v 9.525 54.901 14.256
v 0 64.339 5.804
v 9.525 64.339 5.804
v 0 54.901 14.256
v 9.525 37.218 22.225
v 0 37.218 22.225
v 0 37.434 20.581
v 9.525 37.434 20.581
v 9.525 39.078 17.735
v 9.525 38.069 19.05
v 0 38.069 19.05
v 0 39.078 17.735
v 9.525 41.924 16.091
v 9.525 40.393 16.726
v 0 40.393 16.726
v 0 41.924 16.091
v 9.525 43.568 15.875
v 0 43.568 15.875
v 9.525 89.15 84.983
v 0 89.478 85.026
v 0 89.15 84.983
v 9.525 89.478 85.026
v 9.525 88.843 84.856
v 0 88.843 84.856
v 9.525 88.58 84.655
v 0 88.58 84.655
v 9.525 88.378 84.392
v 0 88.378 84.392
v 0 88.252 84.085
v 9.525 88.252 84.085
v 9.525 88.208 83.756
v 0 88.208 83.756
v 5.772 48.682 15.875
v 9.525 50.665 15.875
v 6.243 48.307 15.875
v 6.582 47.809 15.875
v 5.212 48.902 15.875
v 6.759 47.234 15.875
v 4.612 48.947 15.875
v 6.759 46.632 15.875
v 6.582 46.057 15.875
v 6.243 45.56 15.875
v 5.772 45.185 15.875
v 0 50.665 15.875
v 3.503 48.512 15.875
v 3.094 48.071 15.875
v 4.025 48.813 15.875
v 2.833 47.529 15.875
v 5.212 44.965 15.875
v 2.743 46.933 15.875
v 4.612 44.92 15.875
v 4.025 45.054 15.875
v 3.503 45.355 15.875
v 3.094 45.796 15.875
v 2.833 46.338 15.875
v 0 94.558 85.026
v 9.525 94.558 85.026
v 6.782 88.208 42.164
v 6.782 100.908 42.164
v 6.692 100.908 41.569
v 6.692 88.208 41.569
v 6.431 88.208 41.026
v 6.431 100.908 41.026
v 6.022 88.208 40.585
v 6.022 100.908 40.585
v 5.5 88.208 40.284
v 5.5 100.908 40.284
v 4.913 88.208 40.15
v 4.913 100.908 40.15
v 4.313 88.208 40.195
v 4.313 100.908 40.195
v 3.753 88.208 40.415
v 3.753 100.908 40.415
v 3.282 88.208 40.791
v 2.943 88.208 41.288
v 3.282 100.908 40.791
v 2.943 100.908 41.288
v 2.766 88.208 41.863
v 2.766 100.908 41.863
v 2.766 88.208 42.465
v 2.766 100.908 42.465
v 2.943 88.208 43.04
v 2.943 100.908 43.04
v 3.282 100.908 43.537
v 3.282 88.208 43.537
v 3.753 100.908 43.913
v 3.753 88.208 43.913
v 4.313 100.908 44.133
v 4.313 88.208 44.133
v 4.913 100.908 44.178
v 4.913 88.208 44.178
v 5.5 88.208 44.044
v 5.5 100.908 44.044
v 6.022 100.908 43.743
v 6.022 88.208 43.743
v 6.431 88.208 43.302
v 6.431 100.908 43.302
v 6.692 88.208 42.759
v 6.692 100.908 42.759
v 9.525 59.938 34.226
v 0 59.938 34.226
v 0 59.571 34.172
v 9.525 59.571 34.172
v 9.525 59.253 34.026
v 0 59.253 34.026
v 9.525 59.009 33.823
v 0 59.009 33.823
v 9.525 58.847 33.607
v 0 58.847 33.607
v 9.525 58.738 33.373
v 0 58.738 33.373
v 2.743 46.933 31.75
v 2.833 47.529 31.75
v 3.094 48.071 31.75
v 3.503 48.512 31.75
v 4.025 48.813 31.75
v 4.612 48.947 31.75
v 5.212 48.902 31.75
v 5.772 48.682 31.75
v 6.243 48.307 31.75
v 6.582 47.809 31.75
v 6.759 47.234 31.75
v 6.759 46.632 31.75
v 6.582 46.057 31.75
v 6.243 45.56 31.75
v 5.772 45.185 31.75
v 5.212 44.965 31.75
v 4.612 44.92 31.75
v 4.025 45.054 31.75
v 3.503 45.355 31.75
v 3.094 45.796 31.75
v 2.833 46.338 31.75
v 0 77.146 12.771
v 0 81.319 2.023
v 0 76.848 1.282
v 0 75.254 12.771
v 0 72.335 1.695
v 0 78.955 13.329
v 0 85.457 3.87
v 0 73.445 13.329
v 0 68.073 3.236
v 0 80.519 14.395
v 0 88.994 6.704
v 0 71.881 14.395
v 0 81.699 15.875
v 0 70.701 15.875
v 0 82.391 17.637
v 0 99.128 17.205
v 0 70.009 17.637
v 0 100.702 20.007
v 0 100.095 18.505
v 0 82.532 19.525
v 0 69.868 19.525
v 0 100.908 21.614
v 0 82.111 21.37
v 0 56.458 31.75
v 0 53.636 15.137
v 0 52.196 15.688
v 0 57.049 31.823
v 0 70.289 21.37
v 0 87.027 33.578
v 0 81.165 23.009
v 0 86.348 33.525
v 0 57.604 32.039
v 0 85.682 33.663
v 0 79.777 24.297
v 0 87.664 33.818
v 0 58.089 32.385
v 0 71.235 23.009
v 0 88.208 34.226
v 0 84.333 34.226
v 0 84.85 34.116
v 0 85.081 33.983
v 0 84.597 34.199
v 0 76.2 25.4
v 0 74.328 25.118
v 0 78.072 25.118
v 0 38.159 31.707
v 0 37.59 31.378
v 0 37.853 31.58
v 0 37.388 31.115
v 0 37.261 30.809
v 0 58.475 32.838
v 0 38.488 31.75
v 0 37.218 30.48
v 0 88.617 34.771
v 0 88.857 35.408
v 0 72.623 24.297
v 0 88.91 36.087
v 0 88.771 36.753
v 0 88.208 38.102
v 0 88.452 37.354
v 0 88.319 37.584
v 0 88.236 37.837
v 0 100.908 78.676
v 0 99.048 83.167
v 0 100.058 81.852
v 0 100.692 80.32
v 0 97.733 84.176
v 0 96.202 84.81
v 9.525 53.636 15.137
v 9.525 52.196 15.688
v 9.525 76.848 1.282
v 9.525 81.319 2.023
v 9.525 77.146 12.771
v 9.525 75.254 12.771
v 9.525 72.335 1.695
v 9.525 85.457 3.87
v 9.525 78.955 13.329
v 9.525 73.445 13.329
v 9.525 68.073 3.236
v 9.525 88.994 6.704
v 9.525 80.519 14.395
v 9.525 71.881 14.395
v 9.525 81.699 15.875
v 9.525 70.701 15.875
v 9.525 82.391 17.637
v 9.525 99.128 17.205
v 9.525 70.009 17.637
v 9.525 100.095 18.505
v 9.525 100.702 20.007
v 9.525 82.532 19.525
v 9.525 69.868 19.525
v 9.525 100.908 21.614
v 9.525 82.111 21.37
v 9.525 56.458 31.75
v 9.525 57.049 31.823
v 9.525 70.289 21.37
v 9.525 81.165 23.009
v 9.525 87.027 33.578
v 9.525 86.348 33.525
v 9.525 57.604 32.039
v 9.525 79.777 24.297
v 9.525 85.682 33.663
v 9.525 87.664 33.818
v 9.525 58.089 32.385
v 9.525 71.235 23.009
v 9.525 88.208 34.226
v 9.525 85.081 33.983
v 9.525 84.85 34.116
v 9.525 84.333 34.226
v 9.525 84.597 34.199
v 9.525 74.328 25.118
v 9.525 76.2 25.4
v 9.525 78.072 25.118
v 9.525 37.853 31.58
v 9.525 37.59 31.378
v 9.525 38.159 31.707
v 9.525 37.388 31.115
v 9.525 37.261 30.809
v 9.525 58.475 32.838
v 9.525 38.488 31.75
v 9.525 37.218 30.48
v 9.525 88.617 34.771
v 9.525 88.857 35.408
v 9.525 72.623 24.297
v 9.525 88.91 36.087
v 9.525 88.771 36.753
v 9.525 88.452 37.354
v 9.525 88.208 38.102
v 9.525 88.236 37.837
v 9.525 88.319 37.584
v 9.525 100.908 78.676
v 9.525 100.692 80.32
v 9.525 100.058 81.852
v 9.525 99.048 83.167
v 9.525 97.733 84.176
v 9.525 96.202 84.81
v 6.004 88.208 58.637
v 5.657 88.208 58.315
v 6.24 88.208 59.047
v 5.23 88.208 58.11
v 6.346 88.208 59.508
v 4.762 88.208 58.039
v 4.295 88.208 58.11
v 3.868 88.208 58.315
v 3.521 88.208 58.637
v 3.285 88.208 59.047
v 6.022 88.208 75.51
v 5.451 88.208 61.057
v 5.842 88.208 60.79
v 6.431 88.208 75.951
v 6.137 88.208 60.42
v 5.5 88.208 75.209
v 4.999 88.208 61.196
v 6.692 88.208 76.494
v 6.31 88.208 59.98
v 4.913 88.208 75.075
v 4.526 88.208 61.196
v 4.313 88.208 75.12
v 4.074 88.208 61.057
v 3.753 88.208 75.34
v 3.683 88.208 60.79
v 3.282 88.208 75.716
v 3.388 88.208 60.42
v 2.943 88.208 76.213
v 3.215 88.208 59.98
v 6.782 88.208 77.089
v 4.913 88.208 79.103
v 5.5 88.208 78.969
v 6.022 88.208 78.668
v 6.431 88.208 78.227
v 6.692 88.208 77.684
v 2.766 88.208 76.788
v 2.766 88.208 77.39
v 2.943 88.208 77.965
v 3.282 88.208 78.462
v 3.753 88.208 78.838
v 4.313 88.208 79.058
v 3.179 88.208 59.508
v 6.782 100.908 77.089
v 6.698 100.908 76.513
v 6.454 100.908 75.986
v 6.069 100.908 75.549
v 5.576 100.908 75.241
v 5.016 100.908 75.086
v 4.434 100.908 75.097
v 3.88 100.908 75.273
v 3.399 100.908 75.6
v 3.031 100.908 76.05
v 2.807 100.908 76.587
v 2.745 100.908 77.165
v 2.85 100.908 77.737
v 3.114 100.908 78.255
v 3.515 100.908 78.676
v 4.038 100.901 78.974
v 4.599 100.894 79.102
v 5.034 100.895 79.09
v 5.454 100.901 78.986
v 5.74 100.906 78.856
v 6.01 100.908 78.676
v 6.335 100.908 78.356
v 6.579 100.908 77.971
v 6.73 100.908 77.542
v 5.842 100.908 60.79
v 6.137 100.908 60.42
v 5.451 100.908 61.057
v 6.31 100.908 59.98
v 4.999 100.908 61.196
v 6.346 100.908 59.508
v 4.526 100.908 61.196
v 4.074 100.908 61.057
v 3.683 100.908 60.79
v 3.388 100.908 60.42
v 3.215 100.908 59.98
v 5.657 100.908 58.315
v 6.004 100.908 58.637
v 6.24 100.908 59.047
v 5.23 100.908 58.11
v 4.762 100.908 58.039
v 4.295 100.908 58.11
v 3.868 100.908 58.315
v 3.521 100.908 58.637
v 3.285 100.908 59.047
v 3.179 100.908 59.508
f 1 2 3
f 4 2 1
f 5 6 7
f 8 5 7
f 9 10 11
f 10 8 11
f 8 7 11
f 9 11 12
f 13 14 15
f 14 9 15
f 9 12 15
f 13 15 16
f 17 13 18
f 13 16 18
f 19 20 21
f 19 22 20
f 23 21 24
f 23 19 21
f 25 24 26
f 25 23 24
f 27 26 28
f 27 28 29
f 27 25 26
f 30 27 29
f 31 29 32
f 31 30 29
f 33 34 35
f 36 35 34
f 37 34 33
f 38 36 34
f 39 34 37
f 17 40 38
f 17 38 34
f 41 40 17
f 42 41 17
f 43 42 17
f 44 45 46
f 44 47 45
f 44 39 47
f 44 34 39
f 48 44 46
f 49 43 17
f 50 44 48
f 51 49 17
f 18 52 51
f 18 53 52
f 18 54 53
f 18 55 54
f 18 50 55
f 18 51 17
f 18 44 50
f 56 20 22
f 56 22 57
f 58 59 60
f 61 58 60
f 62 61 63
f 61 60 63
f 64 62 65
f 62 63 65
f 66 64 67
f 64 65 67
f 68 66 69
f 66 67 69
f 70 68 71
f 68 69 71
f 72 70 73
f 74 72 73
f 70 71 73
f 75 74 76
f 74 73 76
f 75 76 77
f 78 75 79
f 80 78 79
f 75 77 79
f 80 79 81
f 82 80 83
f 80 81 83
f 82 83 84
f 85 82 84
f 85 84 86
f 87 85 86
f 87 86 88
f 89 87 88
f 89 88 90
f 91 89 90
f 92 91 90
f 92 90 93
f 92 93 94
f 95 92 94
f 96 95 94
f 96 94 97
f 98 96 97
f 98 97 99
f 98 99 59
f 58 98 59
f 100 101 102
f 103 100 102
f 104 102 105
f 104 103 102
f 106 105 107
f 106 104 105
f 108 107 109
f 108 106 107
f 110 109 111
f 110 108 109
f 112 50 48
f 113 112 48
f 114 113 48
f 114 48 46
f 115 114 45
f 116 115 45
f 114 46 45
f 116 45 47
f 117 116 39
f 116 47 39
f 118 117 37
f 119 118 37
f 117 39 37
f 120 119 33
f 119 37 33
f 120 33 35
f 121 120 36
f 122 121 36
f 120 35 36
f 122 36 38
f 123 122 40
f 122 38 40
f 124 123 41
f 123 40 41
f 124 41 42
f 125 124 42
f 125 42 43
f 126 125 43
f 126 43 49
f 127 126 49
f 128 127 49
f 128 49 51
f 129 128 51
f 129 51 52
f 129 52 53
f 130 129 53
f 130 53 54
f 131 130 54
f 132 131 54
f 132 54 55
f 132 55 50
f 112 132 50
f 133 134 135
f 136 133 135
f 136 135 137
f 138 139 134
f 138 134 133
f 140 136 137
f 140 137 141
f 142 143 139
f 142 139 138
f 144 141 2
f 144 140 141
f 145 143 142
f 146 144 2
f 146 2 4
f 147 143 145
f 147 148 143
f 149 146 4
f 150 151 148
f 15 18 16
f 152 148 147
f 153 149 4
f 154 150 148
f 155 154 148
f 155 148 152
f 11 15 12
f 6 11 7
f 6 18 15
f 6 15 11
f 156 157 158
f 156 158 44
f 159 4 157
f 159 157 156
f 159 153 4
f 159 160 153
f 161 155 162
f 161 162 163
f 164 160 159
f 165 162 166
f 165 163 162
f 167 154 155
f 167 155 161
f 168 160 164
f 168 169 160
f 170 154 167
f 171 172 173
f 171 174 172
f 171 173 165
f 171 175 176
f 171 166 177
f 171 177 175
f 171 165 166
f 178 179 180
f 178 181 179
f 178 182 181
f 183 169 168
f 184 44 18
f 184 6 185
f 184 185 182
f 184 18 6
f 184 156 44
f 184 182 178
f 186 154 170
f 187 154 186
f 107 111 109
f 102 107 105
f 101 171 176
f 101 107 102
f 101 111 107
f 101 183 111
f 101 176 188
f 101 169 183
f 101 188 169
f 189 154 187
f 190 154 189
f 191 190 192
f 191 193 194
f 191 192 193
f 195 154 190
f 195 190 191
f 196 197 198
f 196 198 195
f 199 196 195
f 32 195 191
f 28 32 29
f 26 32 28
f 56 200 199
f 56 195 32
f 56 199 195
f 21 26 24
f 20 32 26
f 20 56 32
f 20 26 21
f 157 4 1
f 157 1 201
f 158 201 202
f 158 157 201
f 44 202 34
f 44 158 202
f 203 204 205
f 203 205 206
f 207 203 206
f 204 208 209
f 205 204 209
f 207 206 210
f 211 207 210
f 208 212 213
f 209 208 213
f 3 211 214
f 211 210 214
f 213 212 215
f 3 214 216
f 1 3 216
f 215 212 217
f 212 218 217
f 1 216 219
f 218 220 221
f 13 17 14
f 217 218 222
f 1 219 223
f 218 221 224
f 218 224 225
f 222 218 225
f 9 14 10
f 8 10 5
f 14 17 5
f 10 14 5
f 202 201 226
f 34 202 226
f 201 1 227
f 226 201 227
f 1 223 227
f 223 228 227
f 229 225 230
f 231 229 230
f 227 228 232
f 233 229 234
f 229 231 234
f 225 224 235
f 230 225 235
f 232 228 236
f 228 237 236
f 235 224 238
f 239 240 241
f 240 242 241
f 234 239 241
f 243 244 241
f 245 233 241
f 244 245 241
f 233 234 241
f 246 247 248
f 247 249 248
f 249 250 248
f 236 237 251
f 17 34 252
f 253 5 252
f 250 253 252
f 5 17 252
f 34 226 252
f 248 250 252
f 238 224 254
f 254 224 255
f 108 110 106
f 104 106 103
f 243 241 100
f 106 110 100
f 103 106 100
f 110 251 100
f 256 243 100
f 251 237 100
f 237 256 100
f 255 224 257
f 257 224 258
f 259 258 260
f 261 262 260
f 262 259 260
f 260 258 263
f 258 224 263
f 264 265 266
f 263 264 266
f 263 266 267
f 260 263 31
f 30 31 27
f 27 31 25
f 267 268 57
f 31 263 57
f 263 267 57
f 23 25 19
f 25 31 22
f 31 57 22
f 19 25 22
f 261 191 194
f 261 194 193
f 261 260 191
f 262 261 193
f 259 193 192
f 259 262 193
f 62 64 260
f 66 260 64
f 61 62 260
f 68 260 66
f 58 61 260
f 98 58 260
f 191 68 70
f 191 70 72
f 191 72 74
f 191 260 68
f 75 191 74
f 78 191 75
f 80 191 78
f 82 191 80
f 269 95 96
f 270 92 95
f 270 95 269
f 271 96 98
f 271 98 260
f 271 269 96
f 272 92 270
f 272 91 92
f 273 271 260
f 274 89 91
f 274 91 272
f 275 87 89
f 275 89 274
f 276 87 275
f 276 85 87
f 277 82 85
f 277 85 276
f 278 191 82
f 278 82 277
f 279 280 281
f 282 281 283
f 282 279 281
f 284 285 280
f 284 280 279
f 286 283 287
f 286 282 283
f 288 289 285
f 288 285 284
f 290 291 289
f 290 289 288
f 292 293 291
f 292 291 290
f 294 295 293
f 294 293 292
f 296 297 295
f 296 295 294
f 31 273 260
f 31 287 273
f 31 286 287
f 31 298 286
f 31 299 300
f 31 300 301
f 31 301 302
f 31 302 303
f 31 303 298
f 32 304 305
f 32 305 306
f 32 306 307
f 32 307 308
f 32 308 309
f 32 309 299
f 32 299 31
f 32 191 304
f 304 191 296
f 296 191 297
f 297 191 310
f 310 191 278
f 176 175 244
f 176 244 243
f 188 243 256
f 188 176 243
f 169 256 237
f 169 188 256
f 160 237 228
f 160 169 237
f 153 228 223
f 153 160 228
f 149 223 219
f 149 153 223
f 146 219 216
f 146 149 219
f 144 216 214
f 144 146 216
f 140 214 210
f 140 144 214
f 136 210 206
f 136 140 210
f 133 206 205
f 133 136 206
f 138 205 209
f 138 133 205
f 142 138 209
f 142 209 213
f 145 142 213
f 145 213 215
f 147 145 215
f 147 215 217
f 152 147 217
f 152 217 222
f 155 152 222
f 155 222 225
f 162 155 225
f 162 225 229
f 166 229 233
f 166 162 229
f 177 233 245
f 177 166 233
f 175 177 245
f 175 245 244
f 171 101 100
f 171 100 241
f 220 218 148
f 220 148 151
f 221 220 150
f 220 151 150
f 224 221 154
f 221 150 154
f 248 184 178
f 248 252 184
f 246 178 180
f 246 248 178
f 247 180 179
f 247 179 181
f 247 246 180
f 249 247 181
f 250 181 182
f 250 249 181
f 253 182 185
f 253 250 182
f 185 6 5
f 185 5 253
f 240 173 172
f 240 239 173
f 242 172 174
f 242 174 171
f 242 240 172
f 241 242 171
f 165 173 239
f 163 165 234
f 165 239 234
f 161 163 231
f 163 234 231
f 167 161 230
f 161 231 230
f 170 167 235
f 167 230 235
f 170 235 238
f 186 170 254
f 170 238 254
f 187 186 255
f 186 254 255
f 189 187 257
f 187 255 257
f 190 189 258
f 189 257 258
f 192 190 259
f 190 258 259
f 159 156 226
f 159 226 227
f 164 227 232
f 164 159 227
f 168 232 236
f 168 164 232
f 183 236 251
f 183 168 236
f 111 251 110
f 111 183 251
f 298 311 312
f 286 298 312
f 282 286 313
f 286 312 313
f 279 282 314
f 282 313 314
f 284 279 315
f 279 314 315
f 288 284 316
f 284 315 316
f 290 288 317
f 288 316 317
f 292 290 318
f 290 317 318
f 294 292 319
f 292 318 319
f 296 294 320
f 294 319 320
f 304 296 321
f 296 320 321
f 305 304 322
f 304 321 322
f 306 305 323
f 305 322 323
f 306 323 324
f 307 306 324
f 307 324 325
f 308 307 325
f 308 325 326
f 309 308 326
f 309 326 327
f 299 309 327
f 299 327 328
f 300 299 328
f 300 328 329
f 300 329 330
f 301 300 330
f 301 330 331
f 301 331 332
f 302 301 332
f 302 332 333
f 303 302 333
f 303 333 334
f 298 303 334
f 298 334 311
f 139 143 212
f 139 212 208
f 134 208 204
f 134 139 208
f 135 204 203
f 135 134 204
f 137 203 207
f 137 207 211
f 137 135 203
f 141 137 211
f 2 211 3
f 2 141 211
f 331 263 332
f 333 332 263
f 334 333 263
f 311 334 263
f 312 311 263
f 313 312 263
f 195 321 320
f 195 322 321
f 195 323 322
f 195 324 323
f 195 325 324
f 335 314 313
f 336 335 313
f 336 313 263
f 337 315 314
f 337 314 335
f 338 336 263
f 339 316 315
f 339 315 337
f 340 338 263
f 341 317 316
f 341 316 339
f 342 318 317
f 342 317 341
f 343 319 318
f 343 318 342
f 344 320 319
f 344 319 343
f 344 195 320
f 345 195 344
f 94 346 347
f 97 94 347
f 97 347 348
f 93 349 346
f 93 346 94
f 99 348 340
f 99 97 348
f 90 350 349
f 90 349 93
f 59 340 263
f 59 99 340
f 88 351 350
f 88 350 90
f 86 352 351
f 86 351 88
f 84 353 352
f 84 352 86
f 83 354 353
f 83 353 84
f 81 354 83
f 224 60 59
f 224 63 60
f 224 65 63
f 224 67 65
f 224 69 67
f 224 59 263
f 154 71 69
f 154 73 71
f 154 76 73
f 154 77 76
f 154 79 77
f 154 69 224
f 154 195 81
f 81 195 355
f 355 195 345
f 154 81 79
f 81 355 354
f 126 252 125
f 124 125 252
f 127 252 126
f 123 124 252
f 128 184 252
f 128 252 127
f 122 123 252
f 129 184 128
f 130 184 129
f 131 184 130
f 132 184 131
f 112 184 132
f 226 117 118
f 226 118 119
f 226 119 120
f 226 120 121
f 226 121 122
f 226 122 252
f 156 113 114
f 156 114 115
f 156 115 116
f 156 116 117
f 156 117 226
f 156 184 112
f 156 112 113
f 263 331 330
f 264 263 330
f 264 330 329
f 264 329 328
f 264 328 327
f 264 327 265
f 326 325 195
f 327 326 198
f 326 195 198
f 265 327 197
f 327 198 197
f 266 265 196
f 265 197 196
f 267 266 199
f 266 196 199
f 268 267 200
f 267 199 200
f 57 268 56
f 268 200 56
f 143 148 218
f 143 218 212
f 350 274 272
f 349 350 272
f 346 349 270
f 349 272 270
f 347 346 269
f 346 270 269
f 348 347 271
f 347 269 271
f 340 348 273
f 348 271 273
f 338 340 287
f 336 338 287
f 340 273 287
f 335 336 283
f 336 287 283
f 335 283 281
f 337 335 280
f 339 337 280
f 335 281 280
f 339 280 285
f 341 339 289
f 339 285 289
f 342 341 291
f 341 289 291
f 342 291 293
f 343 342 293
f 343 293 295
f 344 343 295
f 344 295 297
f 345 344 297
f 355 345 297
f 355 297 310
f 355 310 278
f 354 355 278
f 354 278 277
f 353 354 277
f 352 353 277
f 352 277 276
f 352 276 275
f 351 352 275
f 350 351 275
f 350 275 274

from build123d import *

# Parameters (mm, degrees)
SKETCH1_R              = 6.35
BOSS_EXTRUDE1_DEPTH    = 9.525
SKETCH2_R              = 2.413
CUT_EXTRUDE1_DEPTH     = 133.297838401
F_10_32_TAPPED_HOLE2_D = 4.0386
F_10_32_TAPPED_HOLE3_D = 4.0386
FILLET2_R              = 6.35
FILLET3_R              = 1.27
SKETCH15_R             = 1.5875
DOWEL_PIN_HOLE_DEPTH   = 100.600514289


with BuildPart() as part:
    # Sketch1 → Boss-Extrude1 (new body)
    with BuildSketch(Plane(origin=(0, 0, 0), x_dir=(0, 0, -1), z_dir=(1, 0, 0))):
        with BuildLine():
            Line((-85.0265, 88.20830847), (-85.0265, 100.90830847))
            Line((-85.0265, 100.90830847), (-19.05, 100.90830847))
            Line((-19.05, 100.90830847), (-6.703693037, 88.994416922))
            ThreePointArc((-6.703693037, 88.994416922), (-1.281815332, 76.848084565), (-5.804401761, 64.339033459))
            Line((-5.804401761, 64.339033459), (-15.875, 53.09280847))
            Line((-15.875, 53.09280847), (-15.875, 37.21780847))
            Line((-15.875, 37.21780847), (-31.75, 37.21780847))
            Line((-31.75, 37.21780847), (-31.75, 56.45830847))
            ThreePointArc((-31.75, 56.45830847), (-32.456751337, 58.164557133), (-34.163, 58.87130847))
            Line((-34.163, 58.87130847), (-34.2265, 58.87130847))
            Line((-34.2265, 58.87130847), (-34.2265, 88.20830847))
            Line((-34.2265, 88.20830847), (-85.0265, 88.20830847))
        make_face()
        with Locations(Location((-19.05, 76.2, 0), (0, 0, 180))):
            Circle(SKETCH1_R, mode=Mode.SUBTRACT)
    extrude(amount=BOSS_EXTRUDE1_DEPTH)

    # Sketch2 → Cut-Extrude1 (cut, through all)
    with BuildSketch(Plane(origin=(9.525, 0, 0), x_dir=(0, 0, -1), z_dir=(1, 0, 0))):
        with Locations((-35.932748663, 86.502059807)):
            Circle(SKETCH2_R)
    extrude(amount=-CUT_EXTRUDE1_DEPTH, mode=Mode.SUBTRACT)

    # #10-32 Tapped Hole2 (through all)
    with Locations(Plane(origin=(0, 88.20830847, 0), x_dir=(-1, 0, 0), z_dir=(0, -1, 0))):
        with Locations((-4.7625, -42.164), (-4.7625, -77.089)):
            Hole(F_10_32_TAPPED_HOLE2_D / 2)

    # #10-32 Tapped Hole3 (through all)
    with Locations(Plane.XY.offset(31.75)):
        with Locations((4.7625, 46.93330847)):
            Hole(F_10_32_TAPPED_HOLE3_D / 2)

    # Fillet2
    # the kernel refuses this fillet: 6.35 mm, written as the material it adds along each edge
    with BuildSketch(Plane(origin=(0, 53.09280847, 15.875), x_dir=(0, 0.7449717794882204, -0.6670959809248997), z_dir=(1, 0, 0))) as fillet2_piece_1:
        with BuildLine():
            CenterArc((FILLET2_R * 0.38229614299, -FILLET2_R), FILLET2_R, 90, 41.843324942)
            Line((-FILLET2_R * 0.284799837935, -FILLET2_R * 0.255028220512), (0, 0))
            Line((0, 0), (FILLET2_R * 0.38229614299, 0))
        make_face()
    extrude(amount=9.525)
    # the kernel refuses this fillet: 6.35 mm, written as the material it takes off along each edge
    with BuildSketch(Plane(origin=(-15.875, 100.90830847, 85.0265), x_dir=(0, -1, 0), z_dir=(1, 0, 0))) as fillet2_2_piece_1:
        with BuildLine():
            CenterArc((FILLET2_R, FILLET2_R), FILLET2_R, 180, 90)
            Line((0, FILLET2_R), (0, 0))
            Line((0, 0), (FILLET2_R, 0))
        make_face()
    extrude(amount=41.275, mode=Mode.SUBTRACT)
    with BuildSketch(Plane(origin=(-6.410510576, 100.90830847, 19.05), x_dir=(0, 0, 1), z_dir=(1, 0, 0))) as fillet2_2_piece_2:
        with BuildLine():
            CenterArc((FILLET2_R * 0.403811689842, FILLET2_R), FILLET2_R, 226.021135711, 43.978864289)
            Line((-FILLET2_R * 0.290581277715, FILLET2_R * 0.280403997644), (0, 0))
            Line((0, 0), (FILLET2_R * 0.403811689842, 0))
        make_face()
    extrude(amount=22.346021152, mode=Mode.SUBTRACT)
    with BuildSketch(Plane(origin=(-15.875, 37.21780847, 15.875), x_dir=(0, 0, 1), z_dir=(1, 0, 0))) as fillet2_2_piece_3:
        with BuildLine():
            CenterArc((FILLET2_R, -FILLET2_R), FILLET2_R, 90, 90)
            Line((0, -FILLET2_R), (0, 0))
            Line((0, 0), (FILLET2_R, 0))
        make_face()
    extrude(amount=41.275, mode=Mode.SUBTRACT)

    # Fillet3
    fillet3_edges = [part.edges().sort_by_distance(p)[0] for p in [
        (4.7625, 37.21780847, 31.75),
        (4.7625, 58.87130847, 34.2265),
        (4.7625, 88.20830847, 85.0265),
        (4.7625, 84.795811144, 34.2265),
        (4.7625, 88.20830847, 37.638997326),
    ]]
    fillet(fillet3_edges, radius=FILLET3_R)

    # Sketch15 → Dowel Pin hole (cut, through all)
    with BuildSketch(Plane.XZ.offset(-88.20830847)):
        with Locations(Location((4.7625, 59.6265, 0), (0, 0, 270))):
            Circle(SKETCH15_R)
    extrude(amount=-DOWEL_PIN_HOLE_DEPTH, mode=Mode.SUBTRACT)


solid = part.part
